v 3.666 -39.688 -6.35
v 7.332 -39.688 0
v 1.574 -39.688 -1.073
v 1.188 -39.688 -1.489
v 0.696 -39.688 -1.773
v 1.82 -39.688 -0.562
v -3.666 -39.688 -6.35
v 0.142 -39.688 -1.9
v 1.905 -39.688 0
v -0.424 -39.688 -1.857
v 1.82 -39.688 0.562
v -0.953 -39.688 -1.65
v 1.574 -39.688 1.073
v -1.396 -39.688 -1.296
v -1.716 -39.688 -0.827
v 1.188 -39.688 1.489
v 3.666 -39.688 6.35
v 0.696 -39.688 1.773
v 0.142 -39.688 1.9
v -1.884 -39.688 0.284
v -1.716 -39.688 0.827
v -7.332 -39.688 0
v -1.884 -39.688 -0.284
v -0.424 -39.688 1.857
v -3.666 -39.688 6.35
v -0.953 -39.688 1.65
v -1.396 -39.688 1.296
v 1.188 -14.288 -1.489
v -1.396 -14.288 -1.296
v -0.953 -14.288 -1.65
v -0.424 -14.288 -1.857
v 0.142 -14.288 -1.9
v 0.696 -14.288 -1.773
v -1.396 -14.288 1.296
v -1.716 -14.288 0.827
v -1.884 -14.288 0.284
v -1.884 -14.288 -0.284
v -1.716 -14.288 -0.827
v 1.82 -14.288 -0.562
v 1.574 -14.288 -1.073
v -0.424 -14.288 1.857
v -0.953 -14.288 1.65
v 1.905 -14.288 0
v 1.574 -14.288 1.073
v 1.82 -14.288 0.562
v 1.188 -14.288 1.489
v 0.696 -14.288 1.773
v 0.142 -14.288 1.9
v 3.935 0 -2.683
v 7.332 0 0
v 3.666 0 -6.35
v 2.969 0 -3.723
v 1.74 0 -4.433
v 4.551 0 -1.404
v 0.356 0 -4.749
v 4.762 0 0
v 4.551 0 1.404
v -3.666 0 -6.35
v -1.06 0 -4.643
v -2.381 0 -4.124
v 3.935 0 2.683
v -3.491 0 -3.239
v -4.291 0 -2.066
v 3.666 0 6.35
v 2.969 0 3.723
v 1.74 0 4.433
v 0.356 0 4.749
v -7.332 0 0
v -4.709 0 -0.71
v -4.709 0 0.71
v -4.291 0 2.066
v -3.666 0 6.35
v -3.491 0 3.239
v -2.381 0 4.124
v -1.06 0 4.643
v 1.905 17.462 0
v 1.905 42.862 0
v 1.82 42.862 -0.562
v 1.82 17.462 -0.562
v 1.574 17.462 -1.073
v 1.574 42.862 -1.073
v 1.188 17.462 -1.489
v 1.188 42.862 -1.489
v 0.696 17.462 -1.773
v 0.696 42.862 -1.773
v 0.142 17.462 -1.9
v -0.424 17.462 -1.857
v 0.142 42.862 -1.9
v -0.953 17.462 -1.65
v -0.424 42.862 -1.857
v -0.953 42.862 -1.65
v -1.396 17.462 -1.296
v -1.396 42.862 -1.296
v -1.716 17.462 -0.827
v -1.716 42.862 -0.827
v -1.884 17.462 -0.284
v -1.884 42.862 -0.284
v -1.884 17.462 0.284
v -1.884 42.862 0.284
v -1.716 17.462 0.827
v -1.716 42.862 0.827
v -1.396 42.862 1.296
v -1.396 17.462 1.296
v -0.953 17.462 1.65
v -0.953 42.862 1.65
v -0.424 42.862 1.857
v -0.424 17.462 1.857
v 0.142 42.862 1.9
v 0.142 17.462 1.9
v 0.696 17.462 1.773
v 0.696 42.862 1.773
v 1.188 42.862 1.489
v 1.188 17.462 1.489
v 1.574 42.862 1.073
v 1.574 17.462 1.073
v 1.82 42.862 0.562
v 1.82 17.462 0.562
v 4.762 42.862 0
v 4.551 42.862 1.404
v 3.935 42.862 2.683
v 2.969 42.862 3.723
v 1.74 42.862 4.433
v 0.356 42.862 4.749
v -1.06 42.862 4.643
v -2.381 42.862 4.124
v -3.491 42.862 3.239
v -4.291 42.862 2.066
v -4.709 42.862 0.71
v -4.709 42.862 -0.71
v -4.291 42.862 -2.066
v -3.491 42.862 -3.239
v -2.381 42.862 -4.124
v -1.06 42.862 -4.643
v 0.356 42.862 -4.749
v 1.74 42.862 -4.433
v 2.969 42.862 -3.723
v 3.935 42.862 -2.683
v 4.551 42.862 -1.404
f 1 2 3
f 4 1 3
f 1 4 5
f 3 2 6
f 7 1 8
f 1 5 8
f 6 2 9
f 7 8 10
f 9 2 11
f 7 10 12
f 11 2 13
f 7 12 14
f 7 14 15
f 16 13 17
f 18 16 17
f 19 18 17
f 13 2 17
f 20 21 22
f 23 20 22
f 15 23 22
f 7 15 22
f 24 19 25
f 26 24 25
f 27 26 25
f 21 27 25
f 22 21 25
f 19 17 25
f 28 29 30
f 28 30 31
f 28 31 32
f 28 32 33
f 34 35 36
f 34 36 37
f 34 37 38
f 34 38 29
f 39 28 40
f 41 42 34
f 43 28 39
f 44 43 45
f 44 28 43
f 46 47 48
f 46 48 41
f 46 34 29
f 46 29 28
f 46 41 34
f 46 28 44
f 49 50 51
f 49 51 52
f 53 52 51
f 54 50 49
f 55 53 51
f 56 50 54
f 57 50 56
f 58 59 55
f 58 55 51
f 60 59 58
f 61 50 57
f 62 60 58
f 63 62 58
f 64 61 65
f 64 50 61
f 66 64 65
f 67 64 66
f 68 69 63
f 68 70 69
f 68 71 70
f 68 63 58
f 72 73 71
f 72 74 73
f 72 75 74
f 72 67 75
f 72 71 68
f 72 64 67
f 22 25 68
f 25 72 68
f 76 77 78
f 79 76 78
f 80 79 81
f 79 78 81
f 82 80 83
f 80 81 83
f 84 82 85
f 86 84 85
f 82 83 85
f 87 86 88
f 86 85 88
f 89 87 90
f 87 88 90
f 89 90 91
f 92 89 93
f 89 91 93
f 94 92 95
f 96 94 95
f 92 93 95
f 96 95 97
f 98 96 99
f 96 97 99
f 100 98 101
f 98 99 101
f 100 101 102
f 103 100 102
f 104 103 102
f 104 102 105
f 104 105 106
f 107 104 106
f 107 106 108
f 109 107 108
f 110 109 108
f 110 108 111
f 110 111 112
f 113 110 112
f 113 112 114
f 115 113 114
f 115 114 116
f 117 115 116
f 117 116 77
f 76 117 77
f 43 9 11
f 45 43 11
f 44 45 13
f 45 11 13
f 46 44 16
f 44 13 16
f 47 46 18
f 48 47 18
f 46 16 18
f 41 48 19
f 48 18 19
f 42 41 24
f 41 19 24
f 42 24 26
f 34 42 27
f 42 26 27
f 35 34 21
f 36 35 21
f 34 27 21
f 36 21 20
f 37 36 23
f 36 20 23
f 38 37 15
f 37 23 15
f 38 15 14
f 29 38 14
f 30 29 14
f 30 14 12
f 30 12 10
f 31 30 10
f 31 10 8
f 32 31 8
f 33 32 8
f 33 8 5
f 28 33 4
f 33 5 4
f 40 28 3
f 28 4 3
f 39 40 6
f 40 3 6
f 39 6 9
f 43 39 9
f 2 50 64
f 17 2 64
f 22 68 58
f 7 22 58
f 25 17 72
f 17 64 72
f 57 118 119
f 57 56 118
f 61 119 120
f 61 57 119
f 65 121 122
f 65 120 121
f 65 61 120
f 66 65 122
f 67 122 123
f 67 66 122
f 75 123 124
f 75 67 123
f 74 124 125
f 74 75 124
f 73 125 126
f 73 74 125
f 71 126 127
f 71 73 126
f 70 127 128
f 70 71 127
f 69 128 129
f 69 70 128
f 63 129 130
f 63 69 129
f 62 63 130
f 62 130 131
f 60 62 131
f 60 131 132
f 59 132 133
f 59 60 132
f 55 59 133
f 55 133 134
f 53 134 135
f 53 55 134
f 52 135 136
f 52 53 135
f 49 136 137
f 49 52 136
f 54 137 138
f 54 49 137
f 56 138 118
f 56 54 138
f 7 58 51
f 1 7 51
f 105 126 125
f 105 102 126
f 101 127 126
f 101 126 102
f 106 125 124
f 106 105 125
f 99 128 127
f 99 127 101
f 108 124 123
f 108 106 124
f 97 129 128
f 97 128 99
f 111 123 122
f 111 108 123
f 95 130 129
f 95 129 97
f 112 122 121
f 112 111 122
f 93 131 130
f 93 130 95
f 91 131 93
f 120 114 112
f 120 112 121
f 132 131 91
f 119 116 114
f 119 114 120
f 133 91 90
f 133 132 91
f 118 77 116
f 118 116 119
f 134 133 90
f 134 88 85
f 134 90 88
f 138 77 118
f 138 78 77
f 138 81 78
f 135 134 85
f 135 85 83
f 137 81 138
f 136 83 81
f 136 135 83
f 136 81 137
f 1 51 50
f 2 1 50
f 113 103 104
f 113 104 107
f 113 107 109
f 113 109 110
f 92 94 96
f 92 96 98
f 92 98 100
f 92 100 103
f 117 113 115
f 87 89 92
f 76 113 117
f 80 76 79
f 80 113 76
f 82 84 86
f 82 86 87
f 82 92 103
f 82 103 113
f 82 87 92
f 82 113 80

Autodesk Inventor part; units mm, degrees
ref_plane "YZ Plane" through (0, 0, 0) normal (1, 0, 0) x (0, 1, 0)
ref_plane "XZ Plane" through (0, 0, 0) normal (0, 1, 0) x (-1, 0, 0)
ref_plane "XY Plane" through (0, 0, 0) normal (0, 0, 1) x (1, 0, 0)
sketch "Sketch1" plane through (0, 0, 0) normal (0, 1, 0) x (-1, 0, 0)
  line L0 (3.6662, -6.35) -> (-3.6662, -6.35)
  line L1 (-3.6662, -6.35) -> (-7.3323, 0)
  line L2 (-7.3323, 0) -> (-3.6662, 6.35)
  line L3 (-3.6662, 6.35) -> (3.6662, 6.35)
  line L4 (3.6662, 6.35) -> (7.3323, 0)
  line L5 (7.3323, 0) -> (3.6662, -6.35)
  point P0 (0, 0)
  point P1 (0, 0)
  dimension "d0" = 12.7
extrude "Extrusion1" add sketch "Sketch1" against normal blind 39.6875
sketch "Sketch2" plane through (0, 0, 0) normal (0, 1, 0) x (1, 0, 0)
  circle A0 centre (0, 0) radius 4.7625
  dimension "d3" = 9.525
extrude "Extrusion2" add sketch "Sketch2" along normal blind 42.8625
sketch "Sketch3" plane through (0, -39.6875, 0) normal (0, -1, 0) x (1, 0, 0)
  circle A0 centre (0, 0) radius 4.7625 projected
  circle A1 centre (0, 0) radius 1.905
  dimension "d7" = 3.81
extrude "Extrusion3" cut sketch "Sketch3" against normal blind 25.4 contours A1
sketch "Sketch4" plane through (0, 42.8625, 0) normal (0, 1, 0) x (1, 0, 0)
  circle A0 centre (0, 0) radius 1.905 projected
extrude "Extrusion4" cut sketch "Sketch4" against normal blind 25.4
properties part number "Roller driven shaft" material "Aluminum 6061"
